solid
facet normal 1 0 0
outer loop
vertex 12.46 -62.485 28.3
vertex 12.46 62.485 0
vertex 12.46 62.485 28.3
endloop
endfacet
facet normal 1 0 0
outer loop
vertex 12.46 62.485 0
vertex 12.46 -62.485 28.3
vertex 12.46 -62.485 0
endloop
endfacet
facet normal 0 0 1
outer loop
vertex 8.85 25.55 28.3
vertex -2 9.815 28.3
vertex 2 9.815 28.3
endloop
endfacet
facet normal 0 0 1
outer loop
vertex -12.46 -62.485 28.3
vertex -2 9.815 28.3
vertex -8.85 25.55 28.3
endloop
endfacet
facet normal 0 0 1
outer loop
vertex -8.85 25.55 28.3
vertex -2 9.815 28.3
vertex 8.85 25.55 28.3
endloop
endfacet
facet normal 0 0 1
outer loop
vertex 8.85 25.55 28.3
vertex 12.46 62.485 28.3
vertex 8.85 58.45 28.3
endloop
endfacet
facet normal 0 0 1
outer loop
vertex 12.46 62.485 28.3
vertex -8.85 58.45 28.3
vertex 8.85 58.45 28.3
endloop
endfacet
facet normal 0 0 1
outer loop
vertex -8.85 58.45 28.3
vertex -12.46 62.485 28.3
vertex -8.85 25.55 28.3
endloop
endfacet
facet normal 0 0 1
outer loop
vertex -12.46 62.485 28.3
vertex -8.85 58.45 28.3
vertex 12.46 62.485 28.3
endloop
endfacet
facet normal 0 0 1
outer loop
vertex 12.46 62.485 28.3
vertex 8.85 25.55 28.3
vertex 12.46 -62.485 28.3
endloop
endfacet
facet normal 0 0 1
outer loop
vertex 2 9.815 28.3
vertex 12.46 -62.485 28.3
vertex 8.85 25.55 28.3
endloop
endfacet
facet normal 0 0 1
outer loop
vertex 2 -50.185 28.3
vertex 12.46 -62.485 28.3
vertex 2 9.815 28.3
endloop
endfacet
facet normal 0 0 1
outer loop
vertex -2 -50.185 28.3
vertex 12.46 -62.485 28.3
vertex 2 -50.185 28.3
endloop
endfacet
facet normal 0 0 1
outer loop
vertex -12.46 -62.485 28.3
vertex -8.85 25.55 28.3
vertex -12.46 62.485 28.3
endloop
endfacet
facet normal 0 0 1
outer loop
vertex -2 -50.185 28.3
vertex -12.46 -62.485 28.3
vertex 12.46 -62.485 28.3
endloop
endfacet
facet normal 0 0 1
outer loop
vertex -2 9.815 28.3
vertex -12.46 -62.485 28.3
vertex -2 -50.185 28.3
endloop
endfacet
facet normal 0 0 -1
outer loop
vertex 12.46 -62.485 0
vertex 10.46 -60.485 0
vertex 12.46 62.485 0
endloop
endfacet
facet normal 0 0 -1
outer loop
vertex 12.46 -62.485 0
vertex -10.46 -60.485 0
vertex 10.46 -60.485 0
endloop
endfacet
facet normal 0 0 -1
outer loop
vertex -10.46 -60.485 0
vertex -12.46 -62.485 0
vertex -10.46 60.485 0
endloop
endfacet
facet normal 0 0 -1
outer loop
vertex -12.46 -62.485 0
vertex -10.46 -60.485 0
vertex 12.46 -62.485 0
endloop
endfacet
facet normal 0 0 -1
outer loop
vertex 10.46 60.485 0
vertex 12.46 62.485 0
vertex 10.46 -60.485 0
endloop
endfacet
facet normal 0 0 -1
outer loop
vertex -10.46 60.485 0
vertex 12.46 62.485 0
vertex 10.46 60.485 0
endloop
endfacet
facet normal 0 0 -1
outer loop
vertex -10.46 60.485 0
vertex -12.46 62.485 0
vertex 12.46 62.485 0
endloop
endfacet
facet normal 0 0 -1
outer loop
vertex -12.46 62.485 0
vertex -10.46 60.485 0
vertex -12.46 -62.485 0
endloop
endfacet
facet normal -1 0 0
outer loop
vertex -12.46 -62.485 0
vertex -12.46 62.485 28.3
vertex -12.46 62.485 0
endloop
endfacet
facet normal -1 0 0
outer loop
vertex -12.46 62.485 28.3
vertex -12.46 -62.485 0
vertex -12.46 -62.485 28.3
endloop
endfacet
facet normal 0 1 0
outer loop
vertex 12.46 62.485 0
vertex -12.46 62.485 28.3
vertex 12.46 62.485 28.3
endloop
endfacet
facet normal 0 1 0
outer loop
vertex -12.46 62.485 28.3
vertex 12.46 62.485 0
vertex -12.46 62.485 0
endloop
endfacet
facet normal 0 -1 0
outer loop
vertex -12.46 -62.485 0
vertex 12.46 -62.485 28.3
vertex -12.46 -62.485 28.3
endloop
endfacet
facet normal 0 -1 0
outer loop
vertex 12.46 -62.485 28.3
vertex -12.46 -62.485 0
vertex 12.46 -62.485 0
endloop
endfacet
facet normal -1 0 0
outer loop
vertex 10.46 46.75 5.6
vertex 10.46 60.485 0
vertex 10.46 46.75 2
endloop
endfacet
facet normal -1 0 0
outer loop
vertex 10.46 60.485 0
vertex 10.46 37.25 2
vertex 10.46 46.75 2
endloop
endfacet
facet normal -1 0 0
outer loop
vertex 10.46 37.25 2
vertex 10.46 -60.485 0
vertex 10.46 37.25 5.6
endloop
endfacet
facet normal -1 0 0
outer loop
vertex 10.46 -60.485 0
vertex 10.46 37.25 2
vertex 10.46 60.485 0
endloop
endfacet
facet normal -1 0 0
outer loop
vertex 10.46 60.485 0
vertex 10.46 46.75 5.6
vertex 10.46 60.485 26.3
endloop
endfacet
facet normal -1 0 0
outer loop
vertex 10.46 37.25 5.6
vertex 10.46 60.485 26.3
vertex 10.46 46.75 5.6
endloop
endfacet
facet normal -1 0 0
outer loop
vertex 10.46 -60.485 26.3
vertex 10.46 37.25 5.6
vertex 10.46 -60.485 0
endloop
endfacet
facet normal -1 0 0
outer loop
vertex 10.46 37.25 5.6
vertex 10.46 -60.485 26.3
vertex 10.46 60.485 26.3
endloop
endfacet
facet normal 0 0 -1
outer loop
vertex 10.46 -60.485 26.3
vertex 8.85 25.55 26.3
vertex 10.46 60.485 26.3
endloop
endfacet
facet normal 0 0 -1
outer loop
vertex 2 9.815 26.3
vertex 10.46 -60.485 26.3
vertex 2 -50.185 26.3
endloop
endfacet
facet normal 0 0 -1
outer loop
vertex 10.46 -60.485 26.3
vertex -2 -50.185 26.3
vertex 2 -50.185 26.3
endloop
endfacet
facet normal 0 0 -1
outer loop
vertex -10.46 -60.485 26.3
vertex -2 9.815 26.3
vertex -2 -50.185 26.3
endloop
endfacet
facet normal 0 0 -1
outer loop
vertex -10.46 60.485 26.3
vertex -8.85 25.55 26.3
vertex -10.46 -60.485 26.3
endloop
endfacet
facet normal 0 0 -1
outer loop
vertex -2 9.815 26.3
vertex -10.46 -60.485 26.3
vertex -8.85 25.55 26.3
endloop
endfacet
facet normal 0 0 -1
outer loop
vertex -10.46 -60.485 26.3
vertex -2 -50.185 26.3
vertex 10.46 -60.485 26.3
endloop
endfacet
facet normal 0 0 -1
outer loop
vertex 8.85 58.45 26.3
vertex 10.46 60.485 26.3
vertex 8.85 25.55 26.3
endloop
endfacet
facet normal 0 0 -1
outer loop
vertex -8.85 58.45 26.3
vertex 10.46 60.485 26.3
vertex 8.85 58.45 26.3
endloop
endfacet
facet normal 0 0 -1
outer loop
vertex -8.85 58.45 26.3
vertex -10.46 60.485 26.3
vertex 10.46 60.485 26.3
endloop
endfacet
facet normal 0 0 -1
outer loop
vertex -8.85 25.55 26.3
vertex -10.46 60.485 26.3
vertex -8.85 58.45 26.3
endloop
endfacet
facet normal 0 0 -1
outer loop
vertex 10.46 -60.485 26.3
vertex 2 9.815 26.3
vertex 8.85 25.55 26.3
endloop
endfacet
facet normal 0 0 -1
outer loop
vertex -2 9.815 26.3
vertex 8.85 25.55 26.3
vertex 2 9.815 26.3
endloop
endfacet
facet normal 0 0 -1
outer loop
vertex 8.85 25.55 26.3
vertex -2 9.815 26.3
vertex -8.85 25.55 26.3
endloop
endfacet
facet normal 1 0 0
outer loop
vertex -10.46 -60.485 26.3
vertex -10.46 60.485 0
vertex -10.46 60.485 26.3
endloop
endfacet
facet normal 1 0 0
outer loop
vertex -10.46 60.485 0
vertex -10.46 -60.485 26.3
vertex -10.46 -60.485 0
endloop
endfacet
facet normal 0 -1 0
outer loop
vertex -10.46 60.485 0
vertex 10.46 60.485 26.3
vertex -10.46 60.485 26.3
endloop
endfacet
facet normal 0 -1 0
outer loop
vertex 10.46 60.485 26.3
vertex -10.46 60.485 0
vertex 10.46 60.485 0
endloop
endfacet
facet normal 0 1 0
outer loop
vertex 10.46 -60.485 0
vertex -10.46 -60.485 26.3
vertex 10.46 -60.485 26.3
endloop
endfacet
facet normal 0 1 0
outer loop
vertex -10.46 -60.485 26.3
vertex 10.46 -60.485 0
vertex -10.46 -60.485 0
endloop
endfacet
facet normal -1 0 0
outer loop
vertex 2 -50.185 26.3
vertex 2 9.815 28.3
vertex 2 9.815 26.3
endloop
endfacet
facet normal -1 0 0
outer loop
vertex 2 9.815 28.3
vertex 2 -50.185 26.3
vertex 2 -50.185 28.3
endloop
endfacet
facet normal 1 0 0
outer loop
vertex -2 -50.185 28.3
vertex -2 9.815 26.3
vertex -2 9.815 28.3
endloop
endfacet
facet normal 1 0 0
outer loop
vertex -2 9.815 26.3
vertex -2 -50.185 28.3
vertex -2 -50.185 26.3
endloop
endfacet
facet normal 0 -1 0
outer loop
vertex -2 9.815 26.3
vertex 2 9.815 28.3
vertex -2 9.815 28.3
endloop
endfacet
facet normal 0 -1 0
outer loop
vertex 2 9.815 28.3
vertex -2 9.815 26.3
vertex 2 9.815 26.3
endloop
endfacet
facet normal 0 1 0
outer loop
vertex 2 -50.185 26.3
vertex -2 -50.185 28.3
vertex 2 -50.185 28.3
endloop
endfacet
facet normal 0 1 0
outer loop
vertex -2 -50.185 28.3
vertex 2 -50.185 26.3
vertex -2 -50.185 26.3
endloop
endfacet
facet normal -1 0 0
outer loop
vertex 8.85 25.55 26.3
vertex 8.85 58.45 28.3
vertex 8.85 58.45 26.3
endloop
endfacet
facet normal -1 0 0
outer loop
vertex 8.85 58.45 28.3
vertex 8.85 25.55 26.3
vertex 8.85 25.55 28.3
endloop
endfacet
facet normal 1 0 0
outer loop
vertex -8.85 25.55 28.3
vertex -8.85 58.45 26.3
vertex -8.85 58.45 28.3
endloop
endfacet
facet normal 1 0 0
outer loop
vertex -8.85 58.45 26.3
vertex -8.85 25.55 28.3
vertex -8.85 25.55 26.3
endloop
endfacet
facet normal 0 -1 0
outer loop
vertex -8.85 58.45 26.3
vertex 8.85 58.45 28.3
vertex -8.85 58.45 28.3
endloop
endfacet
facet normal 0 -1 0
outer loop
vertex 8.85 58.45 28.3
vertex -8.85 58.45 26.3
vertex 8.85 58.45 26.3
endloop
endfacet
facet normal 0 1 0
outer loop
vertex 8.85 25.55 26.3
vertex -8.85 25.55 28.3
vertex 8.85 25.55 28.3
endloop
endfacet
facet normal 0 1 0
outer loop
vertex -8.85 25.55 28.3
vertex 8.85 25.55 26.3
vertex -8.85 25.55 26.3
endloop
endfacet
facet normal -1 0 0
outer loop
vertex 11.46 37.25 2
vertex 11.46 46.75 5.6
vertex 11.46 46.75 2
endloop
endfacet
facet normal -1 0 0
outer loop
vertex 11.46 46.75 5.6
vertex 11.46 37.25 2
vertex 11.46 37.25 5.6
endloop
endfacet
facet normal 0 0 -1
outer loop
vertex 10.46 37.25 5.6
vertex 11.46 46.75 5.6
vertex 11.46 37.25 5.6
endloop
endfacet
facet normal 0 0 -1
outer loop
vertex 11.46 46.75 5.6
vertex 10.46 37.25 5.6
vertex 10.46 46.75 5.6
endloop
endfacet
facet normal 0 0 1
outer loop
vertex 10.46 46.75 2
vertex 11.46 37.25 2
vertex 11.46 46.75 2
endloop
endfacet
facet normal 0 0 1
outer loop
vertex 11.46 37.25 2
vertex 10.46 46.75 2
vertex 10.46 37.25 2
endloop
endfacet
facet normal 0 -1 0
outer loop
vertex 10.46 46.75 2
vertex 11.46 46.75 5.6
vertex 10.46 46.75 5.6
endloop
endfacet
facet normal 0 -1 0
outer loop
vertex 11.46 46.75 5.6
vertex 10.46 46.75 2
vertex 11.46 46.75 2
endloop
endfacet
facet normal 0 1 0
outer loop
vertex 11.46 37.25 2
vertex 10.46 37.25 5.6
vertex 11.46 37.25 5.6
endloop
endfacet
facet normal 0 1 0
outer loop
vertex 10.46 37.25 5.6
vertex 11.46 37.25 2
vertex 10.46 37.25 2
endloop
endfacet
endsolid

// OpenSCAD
// ============================================================
//  Modue — Case do módulo (bandeja/corpo)  v1
//  Fader vertical + display no topo (em linha). Unidades: mm.
//
//  Origem: centro em X e Y; Z=0 = traseira (aberta, recebe a tampa);
//  frente (com janela do display + fenda do knob) em Z = out_d.
//  Componentes entram pela traseira.
// ============================================================

// ---------- Impressão / tolerâncias ----------
wall = 2.0;    // espessura de parede
fit  = 0.3;    // folga de encaixe (FDM)
$fn  = 40;

// ---------- Placa ESP32-C6-LCD-1.47 ----------
pcb_l = 36.37;
pcb_w = 20.32;
win_w = 17.7;   // janela do display (área visível)
win_h = 32.9;

// ---------- Fader (ALPS 80mm, travel 60) ----------
fad_l    = 80.0;
fad_w    = 18.0;
fad_up   = 8.2;    // acima da superfície de montagem
fad_deep = 17.8;   // abaixo (26 total − 8.2)
fad_trav = 60.0;   // curso do knob
slot_w   = 4.0;    // largura da fenda do knob

// ---------- Arranjo ----------
gap_fd = 4.0;   // vão fader <-> placa
usb_w  = 9.5;   // rasgo USB-C (largura)
usb_h  = 3.6;   // rasgo USB-C (altura)

// ---------- Derivadas ----------
inner_w = max(fad_w, pcb_w) + 2*fit;
inner_l = fad_l + gap_fd + pcb_l + 2*fit;
inner_d = fad_deep + fad_up + fit;    // profundidade útil (fader é o mais fundo)

out_w = inner_w + 2*wall;
out_l = inner_l + 2*wall;
out_d = inner_d + wall;               // parede da frente

// centros no comprimento (Y)
fad_y  = -inner_l/2 + fit + fad_l/2;
disp_y =  inner_l/2 - fit - pcb_l/2;

module box(w, l, d) { translate([-w/2,-l/2,0]) cube([w,l,d]); }

module tray() {
  difference() {
    // casca sólida
    box(out_w, out_l, out_d);

    // cavidade interna aberta na traseira (Z de -1 até out_d-wall)
    translate([0,0,-1]) box(inner_w, inner_l, (out_d - wall) + 1);

    // fenda do knob na frente (sobre o fader)
    translate([0, fad_y, out_d - wall - 1])
      box(slot_w, fad_trav, wall + 2);

    // janela do display na frente
    translate([0, disp_y, out_d - wall - 1])
      box(win_w, win_h, wall + 2);

    // rasgo do USB-C (parede lateral, perto da base/placa)
    translate([out_w/2 - wall - 1, disp_y, wall])
      box(wall + 2, usb_w, usb_h);
  }
}

tray();
